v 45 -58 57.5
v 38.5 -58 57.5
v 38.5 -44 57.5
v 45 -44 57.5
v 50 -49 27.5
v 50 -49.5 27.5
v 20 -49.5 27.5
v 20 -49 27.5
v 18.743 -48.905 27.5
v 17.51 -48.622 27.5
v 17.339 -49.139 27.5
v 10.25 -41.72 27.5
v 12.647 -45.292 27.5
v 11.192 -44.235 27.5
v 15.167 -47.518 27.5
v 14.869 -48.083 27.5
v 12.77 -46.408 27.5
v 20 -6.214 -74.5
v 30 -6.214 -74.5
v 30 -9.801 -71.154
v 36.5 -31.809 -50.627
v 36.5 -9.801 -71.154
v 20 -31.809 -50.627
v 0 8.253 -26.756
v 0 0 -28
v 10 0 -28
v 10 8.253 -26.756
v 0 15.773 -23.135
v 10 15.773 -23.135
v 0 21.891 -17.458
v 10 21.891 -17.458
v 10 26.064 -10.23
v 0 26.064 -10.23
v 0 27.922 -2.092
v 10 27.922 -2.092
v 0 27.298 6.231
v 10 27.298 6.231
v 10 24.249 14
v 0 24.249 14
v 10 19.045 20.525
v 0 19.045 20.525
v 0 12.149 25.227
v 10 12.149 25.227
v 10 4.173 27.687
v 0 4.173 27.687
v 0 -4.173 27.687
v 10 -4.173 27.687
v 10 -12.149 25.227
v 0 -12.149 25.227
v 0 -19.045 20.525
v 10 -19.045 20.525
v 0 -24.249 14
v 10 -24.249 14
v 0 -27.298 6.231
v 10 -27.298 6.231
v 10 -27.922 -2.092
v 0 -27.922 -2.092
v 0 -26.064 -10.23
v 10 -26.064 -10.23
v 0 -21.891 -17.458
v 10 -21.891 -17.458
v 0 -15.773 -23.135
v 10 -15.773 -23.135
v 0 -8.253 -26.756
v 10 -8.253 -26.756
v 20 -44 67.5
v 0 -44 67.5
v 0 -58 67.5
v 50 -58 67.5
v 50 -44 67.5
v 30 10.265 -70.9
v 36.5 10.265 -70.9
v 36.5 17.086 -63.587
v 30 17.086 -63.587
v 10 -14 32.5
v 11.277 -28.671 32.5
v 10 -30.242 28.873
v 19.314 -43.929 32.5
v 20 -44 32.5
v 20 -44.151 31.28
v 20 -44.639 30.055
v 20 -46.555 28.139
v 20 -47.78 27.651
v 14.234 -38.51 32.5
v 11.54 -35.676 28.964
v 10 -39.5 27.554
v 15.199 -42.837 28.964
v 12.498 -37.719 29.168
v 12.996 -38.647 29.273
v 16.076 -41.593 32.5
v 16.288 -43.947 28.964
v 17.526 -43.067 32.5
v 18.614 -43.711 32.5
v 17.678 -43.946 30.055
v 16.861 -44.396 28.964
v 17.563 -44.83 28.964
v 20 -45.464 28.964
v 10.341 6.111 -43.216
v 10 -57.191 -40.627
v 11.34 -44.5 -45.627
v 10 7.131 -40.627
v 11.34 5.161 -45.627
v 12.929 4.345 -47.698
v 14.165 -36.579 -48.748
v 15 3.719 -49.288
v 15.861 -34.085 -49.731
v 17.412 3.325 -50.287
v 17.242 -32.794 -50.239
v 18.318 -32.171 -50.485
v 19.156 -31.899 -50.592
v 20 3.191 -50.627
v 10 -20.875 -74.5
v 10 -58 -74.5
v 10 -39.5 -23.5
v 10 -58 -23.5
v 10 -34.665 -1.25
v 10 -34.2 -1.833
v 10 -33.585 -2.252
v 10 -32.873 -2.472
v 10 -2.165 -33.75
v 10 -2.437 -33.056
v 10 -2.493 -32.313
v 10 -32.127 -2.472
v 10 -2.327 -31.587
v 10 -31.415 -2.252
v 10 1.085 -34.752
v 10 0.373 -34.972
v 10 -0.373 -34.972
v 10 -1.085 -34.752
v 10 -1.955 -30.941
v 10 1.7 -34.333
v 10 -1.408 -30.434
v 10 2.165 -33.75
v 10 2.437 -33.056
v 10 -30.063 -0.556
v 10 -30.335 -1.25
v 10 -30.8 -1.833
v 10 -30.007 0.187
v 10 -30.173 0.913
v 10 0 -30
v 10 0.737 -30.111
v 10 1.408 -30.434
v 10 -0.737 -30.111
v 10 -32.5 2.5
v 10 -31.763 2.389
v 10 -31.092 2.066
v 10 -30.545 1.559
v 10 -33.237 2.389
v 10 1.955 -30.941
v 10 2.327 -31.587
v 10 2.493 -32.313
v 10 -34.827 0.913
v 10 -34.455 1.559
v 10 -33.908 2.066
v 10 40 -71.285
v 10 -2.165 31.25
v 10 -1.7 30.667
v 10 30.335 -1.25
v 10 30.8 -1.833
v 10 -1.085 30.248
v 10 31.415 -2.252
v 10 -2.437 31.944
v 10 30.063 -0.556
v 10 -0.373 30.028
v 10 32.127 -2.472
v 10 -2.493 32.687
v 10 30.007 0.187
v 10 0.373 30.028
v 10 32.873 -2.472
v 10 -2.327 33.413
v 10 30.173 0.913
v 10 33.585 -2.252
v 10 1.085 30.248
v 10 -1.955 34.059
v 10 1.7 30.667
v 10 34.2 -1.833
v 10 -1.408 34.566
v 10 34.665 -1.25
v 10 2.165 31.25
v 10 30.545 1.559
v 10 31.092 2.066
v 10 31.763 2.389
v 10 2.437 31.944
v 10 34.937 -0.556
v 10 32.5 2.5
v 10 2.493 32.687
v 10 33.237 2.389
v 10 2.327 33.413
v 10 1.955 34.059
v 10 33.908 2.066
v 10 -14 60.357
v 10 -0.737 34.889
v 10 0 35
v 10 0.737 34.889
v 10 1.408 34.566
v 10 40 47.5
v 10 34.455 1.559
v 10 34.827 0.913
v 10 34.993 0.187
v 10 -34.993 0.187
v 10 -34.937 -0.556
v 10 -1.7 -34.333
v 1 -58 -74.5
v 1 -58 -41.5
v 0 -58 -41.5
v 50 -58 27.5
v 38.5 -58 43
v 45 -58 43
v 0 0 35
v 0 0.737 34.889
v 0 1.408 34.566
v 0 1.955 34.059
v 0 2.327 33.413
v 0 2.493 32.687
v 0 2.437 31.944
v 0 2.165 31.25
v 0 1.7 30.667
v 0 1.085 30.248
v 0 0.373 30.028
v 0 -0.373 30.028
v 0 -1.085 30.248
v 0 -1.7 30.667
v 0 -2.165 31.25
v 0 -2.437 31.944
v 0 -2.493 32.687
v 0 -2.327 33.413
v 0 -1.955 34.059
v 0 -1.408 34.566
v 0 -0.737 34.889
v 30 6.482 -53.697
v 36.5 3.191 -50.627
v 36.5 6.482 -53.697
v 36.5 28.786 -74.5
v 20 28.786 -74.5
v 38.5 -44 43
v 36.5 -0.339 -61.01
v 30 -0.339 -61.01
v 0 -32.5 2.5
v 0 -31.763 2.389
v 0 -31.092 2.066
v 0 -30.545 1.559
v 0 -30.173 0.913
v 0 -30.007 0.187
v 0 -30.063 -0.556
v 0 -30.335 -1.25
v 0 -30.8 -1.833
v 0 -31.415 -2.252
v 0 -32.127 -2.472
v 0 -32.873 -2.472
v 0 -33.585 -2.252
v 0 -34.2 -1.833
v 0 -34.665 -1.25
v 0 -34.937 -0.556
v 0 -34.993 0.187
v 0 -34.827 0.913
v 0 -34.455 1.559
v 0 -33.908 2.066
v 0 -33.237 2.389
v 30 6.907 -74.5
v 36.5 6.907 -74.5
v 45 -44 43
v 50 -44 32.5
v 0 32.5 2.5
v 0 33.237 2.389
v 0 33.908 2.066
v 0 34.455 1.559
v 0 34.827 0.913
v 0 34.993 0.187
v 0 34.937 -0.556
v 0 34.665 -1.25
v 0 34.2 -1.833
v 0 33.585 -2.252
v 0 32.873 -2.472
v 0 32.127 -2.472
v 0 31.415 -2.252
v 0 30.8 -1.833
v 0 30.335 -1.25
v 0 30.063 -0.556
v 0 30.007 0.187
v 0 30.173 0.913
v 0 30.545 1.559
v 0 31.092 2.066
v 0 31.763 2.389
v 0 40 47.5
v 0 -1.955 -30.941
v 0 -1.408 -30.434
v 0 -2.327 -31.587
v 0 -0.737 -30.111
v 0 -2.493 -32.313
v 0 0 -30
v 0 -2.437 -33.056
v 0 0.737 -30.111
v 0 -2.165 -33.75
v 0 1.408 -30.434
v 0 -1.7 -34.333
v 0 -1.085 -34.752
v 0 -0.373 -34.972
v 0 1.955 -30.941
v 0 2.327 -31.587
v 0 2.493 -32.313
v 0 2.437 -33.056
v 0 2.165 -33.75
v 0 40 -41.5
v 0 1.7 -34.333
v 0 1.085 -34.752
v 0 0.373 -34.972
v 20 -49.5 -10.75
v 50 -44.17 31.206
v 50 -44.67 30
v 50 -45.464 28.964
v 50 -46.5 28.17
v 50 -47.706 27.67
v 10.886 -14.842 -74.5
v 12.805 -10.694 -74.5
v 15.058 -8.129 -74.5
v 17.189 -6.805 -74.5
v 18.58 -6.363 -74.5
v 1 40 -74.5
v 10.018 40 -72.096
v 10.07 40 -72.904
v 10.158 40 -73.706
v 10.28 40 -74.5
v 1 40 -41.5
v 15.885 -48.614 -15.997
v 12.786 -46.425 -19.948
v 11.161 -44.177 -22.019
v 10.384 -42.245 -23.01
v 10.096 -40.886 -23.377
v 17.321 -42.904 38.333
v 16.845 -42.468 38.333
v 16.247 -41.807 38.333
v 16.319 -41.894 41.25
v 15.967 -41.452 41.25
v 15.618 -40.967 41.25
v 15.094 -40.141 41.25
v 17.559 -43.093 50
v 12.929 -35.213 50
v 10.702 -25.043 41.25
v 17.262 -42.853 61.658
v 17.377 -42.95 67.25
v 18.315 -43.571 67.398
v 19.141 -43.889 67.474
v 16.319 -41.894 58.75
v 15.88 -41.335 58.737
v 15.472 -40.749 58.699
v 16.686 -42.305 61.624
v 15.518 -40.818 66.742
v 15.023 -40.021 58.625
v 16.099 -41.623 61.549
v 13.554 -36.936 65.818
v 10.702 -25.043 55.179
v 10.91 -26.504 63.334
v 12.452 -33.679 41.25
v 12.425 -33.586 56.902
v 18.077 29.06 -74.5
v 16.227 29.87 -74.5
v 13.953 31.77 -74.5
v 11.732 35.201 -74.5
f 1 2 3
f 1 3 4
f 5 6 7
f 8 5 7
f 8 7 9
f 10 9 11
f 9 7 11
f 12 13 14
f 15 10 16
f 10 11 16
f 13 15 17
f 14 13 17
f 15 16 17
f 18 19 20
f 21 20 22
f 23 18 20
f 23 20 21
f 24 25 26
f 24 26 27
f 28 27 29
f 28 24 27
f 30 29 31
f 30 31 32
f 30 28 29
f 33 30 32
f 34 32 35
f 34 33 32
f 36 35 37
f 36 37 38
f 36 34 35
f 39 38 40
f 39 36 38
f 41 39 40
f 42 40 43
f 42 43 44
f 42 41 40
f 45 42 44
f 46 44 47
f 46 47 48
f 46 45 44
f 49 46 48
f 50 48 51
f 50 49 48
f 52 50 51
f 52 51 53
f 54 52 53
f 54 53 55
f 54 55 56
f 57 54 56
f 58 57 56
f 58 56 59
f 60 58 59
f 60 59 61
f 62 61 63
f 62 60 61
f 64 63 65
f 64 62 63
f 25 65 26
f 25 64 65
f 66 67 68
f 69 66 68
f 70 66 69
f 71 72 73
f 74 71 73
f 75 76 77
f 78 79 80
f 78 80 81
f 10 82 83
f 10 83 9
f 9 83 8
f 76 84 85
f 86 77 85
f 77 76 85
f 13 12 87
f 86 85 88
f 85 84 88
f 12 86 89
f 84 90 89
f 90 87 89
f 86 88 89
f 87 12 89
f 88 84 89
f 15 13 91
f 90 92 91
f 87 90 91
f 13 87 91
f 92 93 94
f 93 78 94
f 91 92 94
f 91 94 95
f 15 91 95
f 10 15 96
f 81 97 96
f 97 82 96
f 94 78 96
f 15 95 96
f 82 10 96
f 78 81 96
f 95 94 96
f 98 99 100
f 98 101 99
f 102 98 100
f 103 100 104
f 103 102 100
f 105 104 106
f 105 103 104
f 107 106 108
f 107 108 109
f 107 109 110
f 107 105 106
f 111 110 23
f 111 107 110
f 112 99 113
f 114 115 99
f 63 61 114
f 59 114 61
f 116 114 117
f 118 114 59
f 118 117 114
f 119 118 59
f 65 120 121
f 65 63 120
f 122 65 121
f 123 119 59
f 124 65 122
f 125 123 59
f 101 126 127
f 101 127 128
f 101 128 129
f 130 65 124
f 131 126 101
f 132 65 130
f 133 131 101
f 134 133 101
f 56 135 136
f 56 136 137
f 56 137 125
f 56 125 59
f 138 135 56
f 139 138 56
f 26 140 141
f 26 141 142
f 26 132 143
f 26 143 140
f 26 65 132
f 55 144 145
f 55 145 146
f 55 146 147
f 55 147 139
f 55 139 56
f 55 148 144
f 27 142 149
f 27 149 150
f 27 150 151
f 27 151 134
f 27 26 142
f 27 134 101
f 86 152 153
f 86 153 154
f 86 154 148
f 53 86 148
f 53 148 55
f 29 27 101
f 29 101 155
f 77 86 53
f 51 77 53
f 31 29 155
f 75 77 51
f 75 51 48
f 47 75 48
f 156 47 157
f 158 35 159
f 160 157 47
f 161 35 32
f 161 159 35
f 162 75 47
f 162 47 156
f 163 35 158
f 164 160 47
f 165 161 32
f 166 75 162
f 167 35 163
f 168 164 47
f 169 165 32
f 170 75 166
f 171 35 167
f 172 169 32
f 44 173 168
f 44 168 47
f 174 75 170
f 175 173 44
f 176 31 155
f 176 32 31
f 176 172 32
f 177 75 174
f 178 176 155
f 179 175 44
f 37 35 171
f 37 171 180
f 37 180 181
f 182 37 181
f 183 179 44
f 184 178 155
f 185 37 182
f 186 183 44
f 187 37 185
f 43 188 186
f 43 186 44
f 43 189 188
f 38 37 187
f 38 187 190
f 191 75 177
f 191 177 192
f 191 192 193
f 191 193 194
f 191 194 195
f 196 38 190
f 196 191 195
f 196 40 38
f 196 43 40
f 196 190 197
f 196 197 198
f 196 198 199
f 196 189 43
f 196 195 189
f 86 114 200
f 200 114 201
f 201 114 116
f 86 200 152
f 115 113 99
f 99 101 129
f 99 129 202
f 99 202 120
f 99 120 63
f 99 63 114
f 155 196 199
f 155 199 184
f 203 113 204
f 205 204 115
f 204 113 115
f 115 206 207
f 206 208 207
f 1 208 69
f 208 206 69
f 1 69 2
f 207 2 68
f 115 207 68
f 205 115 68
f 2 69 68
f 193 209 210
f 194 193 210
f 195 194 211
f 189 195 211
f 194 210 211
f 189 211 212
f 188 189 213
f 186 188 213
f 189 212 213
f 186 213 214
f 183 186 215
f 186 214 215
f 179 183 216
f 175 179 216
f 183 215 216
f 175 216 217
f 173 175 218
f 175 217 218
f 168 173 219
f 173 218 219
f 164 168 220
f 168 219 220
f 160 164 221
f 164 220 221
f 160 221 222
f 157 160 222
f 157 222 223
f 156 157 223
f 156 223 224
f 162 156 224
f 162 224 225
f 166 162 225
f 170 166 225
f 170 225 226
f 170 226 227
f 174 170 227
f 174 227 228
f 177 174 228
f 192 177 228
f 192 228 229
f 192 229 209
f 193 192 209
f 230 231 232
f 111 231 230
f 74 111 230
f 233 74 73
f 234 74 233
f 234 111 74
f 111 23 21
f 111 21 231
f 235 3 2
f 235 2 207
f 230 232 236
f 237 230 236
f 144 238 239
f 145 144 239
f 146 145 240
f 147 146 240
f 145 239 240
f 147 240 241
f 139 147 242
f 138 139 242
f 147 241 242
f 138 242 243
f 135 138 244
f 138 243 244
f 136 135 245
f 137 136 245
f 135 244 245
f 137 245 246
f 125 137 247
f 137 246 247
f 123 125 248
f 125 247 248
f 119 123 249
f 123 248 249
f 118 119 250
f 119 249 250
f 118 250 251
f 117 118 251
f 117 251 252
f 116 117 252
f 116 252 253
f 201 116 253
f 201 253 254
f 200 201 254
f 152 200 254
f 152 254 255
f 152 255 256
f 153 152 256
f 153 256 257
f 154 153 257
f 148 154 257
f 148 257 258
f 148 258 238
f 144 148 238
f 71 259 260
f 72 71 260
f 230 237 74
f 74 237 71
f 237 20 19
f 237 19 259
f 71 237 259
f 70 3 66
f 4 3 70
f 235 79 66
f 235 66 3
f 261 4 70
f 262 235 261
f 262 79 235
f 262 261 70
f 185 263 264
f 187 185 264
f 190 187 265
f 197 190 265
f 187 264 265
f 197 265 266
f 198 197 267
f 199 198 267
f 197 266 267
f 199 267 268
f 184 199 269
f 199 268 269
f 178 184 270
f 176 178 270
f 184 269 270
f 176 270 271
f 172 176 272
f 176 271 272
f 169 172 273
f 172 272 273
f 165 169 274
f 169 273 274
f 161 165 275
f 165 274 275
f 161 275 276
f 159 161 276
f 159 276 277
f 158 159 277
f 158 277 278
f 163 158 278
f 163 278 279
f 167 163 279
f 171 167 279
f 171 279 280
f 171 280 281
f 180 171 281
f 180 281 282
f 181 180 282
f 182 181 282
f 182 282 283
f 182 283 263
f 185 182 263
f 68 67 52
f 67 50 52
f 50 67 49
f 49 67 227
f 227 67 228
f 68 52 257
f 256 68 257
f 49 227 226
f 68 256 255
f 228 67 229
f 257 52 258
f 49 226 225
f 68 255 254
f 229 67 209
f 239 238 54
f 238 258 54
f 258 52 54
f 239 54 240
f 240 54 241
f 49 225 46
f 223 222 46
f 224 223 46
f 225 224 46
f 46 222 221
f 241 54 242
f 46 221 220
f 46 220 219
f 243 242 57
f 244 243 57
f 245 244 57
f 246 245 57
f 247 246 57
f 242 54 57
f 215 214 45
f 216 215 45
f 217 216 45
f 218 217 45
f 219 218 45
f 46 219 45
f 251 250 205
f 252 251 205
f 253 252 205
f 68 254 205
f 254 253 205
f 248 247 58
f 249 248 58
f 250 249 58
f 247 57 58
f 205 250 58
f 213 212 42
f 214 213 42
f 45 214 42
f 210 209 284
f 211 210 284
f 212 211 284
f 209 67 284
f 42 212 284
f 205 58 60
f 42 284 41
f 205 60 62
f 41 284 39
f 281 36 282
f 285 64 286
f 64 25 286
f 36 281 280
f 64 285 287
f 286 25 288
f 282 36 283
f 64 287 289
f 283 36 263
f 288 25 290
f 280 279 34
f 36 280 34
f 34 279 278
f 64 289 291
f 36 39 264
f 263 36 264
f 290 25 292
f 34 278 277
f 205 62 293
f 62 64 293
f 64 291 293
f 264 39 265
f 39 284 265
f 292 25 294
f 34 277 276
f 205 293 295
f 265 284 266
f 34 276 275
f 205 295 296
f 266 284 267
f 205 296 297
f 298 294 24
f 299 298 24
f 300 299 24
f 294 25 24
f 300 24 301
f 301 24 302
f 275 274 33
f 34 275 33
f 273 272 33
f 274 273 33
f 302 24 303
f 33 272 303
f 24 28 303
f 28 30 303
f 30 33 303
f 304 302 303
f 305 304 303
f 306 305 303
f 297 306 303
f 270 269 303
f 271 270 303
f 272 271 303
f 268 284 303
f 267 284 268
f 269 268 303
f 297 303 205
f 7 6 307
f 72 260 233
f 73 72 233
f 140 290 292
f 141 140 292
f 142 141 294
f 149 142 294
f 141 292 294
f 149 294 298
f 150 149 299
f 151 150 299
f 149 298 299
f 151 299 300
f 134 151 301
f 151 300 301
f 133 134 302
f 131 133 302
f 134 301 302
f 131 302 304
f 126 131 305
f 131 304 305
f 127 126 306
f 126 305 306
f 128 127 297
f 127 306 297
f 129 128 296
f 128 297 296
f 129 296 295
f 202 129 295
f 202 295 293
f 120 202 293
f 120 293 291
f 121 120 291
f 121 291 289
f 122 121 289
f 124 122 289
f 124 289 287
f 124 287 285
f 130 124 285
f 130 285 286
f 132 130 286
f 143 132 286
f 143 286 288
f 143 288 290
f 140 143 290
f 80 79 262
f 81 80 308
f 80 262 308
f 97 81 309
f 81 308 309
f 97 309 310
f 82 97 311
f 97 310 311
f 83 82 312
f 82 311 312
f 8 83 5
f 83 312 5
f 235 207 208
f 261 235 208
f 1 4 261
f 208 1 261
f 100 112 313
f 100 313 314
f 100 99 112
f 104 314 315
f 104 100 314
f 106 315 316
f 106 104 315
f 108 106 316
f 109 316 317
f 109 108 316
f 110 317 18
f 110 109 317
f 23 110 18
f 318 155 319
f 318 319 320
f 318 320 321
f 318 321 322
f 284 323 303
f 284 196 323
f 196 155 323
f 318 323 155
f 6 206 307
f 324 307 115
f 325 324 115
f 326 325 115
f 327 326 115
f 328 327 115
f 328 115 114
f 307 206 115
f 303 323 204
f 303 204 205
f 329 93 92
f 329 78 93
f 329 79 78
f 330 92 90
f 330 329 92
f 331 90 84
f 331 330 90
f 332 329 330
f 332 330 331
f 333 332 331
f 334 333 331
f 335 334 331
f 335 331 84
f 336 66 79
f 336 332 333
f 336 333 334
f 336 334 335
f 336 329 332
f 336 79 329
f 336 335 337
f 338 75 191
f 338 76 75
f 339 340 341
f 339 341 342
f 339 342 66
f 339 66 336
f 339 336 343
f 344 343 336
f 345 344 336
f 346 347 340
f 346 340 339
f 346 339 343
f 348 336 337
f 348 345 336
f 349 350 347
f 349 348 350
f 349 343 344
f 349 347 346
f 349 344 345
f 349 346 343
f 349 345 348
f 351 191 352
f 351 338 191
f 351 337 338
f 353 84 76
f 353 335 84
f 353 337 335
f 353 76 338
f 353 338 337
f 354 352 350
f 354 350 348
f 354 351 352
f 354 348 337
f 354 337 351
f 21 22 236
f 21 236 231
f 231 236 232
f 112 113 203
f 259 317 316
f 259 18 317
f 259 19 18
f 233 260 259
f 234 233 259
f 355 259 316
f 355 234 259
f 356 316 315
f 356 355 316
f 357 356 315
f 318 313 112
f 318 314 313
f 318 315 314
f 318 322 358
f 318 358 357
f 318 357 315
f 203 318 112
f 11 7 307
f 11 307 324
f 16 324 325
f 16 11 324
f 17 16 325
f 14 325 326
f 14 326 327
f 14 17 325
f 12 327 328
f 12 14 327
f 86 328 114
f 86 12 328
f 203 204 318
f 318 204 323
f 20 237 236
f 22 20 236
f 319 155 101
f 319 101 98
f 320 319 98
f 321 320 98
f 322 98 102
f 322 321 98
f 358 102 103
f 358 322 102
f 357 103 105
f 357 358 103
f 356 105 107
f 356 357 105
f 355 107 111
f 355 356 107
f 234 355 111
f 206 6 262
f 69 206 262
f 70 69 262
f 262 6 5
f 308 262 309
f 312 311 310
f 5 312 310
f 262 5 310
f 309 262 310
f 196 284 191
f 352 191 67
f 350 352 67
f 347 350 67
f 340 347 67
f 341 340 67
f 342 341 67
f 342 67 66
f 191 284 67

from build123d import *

# Parameters (mm, degrees)
SKETCH1_W                = 95
SKETCH1_H                = 80
SKETCH1_R                = 28
BOSS_EXTRUDE1_DEPTH      = 10
F_5_0_5_DIAMETER_HOLE1_D = 5
SKETCH4_W                = 95
SKETCH4_H                = 18
BOSS_EXTRUDE2_DEPTH      = 10
SKETCH6_W                = 20
SKETCH6_H                = 14
BOSS_EXTRUDE3_DEPTH      = 40
SKETCH10_W               = 50
SKETCH10_H               = 14
BOSS_EXTRUDE4_DEPTH      = 20
SKETCH9_W                = 6.5
SKETCH9_H                = 14.5
CUT_EXTRUDE1_DEPTH       = 20
BOSS_EXTRUDE5_DEPTH      = 5
FILLET3_SIZE             = 10
FILLET3_SIZE_2           = 30
SKETCH15_W               = 10
SKETCH15_H               = 98
CUT_EXTRUDE2_DEPTH       = 6
SKETCH16_W               = 9
SKETCH16_H               = 98
BOSS_EXTRUDE7_DEPTH      = 33
BOSS_EXTRUDE8_DEPTH      = 26.5
CUT_EXTRUDE3_DEPTH       = 6.5
FILLET4_R                = 10
BOSS_EXTRUDE9_DEPTH      = 8.5
FILLET5_R                = 5
FILLET6_R                = 10
CUT_EXTRUDE4_DEPTH       = 133.445770086
CUT_EXTRUDE4_DEPTH_BACK  = 133.445770086
SKETCH20_W               = 6.5
SKETCH20_H               = 14.5


with BuildPart() as part:
    # Sketch1 → Boss-Extrude1 (new body)
    with BuildSketch(Plane(origin=(0, 0, 0), x_dir=(0, 0, -1), z_dir=(1, 0, 0))):
        Rectangle(SKETCH1_W, SKETCH1_H)
        Circle(SKETCH1_R, mode=Mode.SUBTRACT)
    extrude(amount=BOSS_EXTRUDE1_DEPTH)

    # Ø5.0 (5) Diameter Hole1 (through all)
    with Locations(Plane(origin=(10, 0, 0), x_dir=(0, 0, -1), z_dir=(1, 0, 0))):
        with Locations((-32.5, 0), (0, 32.5), (32.5, 0), (0, -32.5)):
            Hole(F_5_0_5_DIAMETER_HOLE1_D / 2)

    # Sketch4 → Boss-Extrude2 (add)
    with BuildSketch(Plane(origin=(10, 0, 0), x_dir=(0, 0, -1), z_dir=(1, 0, 0))):
        with Locations((0, -49)):
            Rectangle(SKETCH4_W, SKETCH4_H)
    extrude(amount=-BOSS_EXTRUDE2_DEPTH)

    # Sketch6 → Boss-Extrude3 (add)
    with BuildSketch(Plane(origin=(10, 0, 0), x_dir=(0, 0, -1), z_dir=(1, 0, 0))):
        with Locations((-37.5, -51)):
            Rectangle(SKETCH6_W, SKETCH6_H)
    extrude(amount=BOSS_EXTRUDE3_DEPTH)

    # Sketch10 → Boss-Extrude4 (add)
    with BuildSketch(Plane.XY.offset(47.5)):
        with Locations((25, -51)):
            Rectangle(SKETCH10_W, SKETCH10_H)
    extrude(amount=BOSS_EXTRUDE4_DEPTH)

    # Sketch9 → Cut-Extrude1 (cut)
    with BuildSketch(Plane(origin=(0, -44, 0), x_dir=(1, 0, 0), z_dir=(0, 1, 0))):
        with Locations((41.75, -50.25)):
            Rectangle(SKETCH9_W, SKETCH9_H)
    extrude(amount=-CUT_EXTRUDE1_DEPTH, mode=Mode.SUBTRACT)

    # Sketch13 → Boss-Extrude5 (add, symmetric)
    with BuildSketch(Plane(origin=(5, 0, 0), x_dir=(0, 0, -1), z_dir=(1, 0, 0))):
        Polygon((-47.5, 40), (-67.5, -44), (-47.5, -44), align=None)
    extrude(amount=BOSS_EXTRUDE5_DEPTH, both=True)

    # Fillet3
    # an asymmetric fillet: 30, 10 mm, written as the material it adds along each edge
    with BuildSketch(Plane(origin=(10, -44, 67.5), x_dir=(1, 0, 0), z_dir=(0, 0, -1))) as fillet3_piece_1_section:
        with BuildLine():
            Bezier((FILLET3_SIZE, 0), (0, 0), (0, -FILLET3_SIZE_2), weights=[1, 0.707106781, 1])
            Line((0, -FILLET3_SIZE_2), (0, 0))
            Line((0, 0), (FILLET3_SIZE, 0))
        make_face()
    fillet3_piece_1 = extrude(amount=40, mode=Mode.PRIVATE)
    fillet3_piece_1 = split(fillet3_piece_1, bisect_by=Plane(origin=(11.956136852, -32.150515723, 64.67869422), z_dir=(0, -0.23162052730603974, -0.9728062146853669)), keep=Keep.TOP, mode=Mode.PRIVATE)
    add(fillet3_piece_1)

    # Sketch15 → Cut-Extrude2 (cut)
    with BuildSketch(Plane(origin=(0, 0, -47.5), x_dir=(-1, 0, 0), z_dir=(0, 0, -1))):
        with Locations((-5, -9)):
            Rectangle(SKETCH15_W, SKETCH15_H)
    extrude(amount=-CUT_EXTRUDE2_DEPTH, mode=Mode.SUBTRACT)

    # Sketch16 → Boss-Extrude7 (add)
    with BuildSketch(Plane(origin=(0, 0, -41.5), x_dir=(-1, 0, 0), z_dir=(0, 0, -1))):
        with Locations((-5.5, -9)):
            Rectangle(SKETCH16_W, SKETCH16_H)
    extrude(amount=BOSS_EXTRUDE7_DEPTH)

    # Sketch17 → Boss-Extrude8 (add)
    with BuildSketch(Plane(origin=(10, 0, 0), x_dir=(0, 0, -1), z_dir=(1, 0, 0))):
        Polygon((50.627369684, 3.19117124), (74.5, 28.786044199), (74.5, -6.213955801), (50.627369684, -31.80882876), align=None)
    extrude(amount=BOSS_EXTRUDE8_DEPTH)

    # Sketch18 → Cut-Extrude3 (cut)
    with BuildSketch(Plane(origin=(36.5, 0, 0), x_dir=(0, 0, -1), z_dir=(1, 0, 0))):
        Polygon((53.696707867, 6.481940621), (61.009528713, -0.338810898), (70.899618415, 10.264779328), (63.58679757, 17.085530846), align=None)
    extrude(amount=-CUT_EXTRUDE3_DEPTH, mode=Mode.SUBTRACT)

    # Fillet4
    fillet4_edges = [part.edges().sort_by_distance(p)[0] for p in [
        (10, 15.98860772, -62.563684842),
        (10, -14.30882876, -50.627369684),
        (10, -19.01139228, -62.563684842),
    ]]
    fillet(fillet4_edges, radius=FILLET4_R)

    # Sketch19 → Boss-Extrude9 (add)
    with BuildSketch(Plane.XZ.offset(58)):
        Polygon((50, 27.5), (10, -23.5), (10, 27.5), align=None)
    extrude(amount=-BOSS_EXTRUDE9_DEPTH)

    # Fillet5
    fillet5_edges = [part.edges().sort_by_distance(p)[0] for p in [
        (35, -44, 27.5),
    ]]
    fillet(fillet5_edges, radius=FILLET5_R)

    # Fillet6
    fillet6_edges = [part.edges().sort_by_distance(p)[0] for p in [
        (10, -49.5, 2),
    ]]
    fillet(fillet6_edges, radius=FILLET6_R)

    # Sketch20 → Cut-Extrude4 (cut, two sides: drawn at the far end of the back side and taken through both)
    with BuildSketch(Plane(origin=(0, -30.588526305, -32.795273685), x_dir=(1, 0, 0), z_dir=(0, 0.6820751518904317, 0.731282084543061)).offset(-CUT_EXTRUDE4_DEPTH_BACK)):
        with Locations((33.25, 48.615317224)):
            Rectangle(SKETCH20_W, SKETCH20_H)
    extrude(amount=CUT_EXTRUDE4_DEPTH + CUT_EXTRUDE4_DEPTH_BACK, mode=Mode.SUBTRACT)


solid = part.part
